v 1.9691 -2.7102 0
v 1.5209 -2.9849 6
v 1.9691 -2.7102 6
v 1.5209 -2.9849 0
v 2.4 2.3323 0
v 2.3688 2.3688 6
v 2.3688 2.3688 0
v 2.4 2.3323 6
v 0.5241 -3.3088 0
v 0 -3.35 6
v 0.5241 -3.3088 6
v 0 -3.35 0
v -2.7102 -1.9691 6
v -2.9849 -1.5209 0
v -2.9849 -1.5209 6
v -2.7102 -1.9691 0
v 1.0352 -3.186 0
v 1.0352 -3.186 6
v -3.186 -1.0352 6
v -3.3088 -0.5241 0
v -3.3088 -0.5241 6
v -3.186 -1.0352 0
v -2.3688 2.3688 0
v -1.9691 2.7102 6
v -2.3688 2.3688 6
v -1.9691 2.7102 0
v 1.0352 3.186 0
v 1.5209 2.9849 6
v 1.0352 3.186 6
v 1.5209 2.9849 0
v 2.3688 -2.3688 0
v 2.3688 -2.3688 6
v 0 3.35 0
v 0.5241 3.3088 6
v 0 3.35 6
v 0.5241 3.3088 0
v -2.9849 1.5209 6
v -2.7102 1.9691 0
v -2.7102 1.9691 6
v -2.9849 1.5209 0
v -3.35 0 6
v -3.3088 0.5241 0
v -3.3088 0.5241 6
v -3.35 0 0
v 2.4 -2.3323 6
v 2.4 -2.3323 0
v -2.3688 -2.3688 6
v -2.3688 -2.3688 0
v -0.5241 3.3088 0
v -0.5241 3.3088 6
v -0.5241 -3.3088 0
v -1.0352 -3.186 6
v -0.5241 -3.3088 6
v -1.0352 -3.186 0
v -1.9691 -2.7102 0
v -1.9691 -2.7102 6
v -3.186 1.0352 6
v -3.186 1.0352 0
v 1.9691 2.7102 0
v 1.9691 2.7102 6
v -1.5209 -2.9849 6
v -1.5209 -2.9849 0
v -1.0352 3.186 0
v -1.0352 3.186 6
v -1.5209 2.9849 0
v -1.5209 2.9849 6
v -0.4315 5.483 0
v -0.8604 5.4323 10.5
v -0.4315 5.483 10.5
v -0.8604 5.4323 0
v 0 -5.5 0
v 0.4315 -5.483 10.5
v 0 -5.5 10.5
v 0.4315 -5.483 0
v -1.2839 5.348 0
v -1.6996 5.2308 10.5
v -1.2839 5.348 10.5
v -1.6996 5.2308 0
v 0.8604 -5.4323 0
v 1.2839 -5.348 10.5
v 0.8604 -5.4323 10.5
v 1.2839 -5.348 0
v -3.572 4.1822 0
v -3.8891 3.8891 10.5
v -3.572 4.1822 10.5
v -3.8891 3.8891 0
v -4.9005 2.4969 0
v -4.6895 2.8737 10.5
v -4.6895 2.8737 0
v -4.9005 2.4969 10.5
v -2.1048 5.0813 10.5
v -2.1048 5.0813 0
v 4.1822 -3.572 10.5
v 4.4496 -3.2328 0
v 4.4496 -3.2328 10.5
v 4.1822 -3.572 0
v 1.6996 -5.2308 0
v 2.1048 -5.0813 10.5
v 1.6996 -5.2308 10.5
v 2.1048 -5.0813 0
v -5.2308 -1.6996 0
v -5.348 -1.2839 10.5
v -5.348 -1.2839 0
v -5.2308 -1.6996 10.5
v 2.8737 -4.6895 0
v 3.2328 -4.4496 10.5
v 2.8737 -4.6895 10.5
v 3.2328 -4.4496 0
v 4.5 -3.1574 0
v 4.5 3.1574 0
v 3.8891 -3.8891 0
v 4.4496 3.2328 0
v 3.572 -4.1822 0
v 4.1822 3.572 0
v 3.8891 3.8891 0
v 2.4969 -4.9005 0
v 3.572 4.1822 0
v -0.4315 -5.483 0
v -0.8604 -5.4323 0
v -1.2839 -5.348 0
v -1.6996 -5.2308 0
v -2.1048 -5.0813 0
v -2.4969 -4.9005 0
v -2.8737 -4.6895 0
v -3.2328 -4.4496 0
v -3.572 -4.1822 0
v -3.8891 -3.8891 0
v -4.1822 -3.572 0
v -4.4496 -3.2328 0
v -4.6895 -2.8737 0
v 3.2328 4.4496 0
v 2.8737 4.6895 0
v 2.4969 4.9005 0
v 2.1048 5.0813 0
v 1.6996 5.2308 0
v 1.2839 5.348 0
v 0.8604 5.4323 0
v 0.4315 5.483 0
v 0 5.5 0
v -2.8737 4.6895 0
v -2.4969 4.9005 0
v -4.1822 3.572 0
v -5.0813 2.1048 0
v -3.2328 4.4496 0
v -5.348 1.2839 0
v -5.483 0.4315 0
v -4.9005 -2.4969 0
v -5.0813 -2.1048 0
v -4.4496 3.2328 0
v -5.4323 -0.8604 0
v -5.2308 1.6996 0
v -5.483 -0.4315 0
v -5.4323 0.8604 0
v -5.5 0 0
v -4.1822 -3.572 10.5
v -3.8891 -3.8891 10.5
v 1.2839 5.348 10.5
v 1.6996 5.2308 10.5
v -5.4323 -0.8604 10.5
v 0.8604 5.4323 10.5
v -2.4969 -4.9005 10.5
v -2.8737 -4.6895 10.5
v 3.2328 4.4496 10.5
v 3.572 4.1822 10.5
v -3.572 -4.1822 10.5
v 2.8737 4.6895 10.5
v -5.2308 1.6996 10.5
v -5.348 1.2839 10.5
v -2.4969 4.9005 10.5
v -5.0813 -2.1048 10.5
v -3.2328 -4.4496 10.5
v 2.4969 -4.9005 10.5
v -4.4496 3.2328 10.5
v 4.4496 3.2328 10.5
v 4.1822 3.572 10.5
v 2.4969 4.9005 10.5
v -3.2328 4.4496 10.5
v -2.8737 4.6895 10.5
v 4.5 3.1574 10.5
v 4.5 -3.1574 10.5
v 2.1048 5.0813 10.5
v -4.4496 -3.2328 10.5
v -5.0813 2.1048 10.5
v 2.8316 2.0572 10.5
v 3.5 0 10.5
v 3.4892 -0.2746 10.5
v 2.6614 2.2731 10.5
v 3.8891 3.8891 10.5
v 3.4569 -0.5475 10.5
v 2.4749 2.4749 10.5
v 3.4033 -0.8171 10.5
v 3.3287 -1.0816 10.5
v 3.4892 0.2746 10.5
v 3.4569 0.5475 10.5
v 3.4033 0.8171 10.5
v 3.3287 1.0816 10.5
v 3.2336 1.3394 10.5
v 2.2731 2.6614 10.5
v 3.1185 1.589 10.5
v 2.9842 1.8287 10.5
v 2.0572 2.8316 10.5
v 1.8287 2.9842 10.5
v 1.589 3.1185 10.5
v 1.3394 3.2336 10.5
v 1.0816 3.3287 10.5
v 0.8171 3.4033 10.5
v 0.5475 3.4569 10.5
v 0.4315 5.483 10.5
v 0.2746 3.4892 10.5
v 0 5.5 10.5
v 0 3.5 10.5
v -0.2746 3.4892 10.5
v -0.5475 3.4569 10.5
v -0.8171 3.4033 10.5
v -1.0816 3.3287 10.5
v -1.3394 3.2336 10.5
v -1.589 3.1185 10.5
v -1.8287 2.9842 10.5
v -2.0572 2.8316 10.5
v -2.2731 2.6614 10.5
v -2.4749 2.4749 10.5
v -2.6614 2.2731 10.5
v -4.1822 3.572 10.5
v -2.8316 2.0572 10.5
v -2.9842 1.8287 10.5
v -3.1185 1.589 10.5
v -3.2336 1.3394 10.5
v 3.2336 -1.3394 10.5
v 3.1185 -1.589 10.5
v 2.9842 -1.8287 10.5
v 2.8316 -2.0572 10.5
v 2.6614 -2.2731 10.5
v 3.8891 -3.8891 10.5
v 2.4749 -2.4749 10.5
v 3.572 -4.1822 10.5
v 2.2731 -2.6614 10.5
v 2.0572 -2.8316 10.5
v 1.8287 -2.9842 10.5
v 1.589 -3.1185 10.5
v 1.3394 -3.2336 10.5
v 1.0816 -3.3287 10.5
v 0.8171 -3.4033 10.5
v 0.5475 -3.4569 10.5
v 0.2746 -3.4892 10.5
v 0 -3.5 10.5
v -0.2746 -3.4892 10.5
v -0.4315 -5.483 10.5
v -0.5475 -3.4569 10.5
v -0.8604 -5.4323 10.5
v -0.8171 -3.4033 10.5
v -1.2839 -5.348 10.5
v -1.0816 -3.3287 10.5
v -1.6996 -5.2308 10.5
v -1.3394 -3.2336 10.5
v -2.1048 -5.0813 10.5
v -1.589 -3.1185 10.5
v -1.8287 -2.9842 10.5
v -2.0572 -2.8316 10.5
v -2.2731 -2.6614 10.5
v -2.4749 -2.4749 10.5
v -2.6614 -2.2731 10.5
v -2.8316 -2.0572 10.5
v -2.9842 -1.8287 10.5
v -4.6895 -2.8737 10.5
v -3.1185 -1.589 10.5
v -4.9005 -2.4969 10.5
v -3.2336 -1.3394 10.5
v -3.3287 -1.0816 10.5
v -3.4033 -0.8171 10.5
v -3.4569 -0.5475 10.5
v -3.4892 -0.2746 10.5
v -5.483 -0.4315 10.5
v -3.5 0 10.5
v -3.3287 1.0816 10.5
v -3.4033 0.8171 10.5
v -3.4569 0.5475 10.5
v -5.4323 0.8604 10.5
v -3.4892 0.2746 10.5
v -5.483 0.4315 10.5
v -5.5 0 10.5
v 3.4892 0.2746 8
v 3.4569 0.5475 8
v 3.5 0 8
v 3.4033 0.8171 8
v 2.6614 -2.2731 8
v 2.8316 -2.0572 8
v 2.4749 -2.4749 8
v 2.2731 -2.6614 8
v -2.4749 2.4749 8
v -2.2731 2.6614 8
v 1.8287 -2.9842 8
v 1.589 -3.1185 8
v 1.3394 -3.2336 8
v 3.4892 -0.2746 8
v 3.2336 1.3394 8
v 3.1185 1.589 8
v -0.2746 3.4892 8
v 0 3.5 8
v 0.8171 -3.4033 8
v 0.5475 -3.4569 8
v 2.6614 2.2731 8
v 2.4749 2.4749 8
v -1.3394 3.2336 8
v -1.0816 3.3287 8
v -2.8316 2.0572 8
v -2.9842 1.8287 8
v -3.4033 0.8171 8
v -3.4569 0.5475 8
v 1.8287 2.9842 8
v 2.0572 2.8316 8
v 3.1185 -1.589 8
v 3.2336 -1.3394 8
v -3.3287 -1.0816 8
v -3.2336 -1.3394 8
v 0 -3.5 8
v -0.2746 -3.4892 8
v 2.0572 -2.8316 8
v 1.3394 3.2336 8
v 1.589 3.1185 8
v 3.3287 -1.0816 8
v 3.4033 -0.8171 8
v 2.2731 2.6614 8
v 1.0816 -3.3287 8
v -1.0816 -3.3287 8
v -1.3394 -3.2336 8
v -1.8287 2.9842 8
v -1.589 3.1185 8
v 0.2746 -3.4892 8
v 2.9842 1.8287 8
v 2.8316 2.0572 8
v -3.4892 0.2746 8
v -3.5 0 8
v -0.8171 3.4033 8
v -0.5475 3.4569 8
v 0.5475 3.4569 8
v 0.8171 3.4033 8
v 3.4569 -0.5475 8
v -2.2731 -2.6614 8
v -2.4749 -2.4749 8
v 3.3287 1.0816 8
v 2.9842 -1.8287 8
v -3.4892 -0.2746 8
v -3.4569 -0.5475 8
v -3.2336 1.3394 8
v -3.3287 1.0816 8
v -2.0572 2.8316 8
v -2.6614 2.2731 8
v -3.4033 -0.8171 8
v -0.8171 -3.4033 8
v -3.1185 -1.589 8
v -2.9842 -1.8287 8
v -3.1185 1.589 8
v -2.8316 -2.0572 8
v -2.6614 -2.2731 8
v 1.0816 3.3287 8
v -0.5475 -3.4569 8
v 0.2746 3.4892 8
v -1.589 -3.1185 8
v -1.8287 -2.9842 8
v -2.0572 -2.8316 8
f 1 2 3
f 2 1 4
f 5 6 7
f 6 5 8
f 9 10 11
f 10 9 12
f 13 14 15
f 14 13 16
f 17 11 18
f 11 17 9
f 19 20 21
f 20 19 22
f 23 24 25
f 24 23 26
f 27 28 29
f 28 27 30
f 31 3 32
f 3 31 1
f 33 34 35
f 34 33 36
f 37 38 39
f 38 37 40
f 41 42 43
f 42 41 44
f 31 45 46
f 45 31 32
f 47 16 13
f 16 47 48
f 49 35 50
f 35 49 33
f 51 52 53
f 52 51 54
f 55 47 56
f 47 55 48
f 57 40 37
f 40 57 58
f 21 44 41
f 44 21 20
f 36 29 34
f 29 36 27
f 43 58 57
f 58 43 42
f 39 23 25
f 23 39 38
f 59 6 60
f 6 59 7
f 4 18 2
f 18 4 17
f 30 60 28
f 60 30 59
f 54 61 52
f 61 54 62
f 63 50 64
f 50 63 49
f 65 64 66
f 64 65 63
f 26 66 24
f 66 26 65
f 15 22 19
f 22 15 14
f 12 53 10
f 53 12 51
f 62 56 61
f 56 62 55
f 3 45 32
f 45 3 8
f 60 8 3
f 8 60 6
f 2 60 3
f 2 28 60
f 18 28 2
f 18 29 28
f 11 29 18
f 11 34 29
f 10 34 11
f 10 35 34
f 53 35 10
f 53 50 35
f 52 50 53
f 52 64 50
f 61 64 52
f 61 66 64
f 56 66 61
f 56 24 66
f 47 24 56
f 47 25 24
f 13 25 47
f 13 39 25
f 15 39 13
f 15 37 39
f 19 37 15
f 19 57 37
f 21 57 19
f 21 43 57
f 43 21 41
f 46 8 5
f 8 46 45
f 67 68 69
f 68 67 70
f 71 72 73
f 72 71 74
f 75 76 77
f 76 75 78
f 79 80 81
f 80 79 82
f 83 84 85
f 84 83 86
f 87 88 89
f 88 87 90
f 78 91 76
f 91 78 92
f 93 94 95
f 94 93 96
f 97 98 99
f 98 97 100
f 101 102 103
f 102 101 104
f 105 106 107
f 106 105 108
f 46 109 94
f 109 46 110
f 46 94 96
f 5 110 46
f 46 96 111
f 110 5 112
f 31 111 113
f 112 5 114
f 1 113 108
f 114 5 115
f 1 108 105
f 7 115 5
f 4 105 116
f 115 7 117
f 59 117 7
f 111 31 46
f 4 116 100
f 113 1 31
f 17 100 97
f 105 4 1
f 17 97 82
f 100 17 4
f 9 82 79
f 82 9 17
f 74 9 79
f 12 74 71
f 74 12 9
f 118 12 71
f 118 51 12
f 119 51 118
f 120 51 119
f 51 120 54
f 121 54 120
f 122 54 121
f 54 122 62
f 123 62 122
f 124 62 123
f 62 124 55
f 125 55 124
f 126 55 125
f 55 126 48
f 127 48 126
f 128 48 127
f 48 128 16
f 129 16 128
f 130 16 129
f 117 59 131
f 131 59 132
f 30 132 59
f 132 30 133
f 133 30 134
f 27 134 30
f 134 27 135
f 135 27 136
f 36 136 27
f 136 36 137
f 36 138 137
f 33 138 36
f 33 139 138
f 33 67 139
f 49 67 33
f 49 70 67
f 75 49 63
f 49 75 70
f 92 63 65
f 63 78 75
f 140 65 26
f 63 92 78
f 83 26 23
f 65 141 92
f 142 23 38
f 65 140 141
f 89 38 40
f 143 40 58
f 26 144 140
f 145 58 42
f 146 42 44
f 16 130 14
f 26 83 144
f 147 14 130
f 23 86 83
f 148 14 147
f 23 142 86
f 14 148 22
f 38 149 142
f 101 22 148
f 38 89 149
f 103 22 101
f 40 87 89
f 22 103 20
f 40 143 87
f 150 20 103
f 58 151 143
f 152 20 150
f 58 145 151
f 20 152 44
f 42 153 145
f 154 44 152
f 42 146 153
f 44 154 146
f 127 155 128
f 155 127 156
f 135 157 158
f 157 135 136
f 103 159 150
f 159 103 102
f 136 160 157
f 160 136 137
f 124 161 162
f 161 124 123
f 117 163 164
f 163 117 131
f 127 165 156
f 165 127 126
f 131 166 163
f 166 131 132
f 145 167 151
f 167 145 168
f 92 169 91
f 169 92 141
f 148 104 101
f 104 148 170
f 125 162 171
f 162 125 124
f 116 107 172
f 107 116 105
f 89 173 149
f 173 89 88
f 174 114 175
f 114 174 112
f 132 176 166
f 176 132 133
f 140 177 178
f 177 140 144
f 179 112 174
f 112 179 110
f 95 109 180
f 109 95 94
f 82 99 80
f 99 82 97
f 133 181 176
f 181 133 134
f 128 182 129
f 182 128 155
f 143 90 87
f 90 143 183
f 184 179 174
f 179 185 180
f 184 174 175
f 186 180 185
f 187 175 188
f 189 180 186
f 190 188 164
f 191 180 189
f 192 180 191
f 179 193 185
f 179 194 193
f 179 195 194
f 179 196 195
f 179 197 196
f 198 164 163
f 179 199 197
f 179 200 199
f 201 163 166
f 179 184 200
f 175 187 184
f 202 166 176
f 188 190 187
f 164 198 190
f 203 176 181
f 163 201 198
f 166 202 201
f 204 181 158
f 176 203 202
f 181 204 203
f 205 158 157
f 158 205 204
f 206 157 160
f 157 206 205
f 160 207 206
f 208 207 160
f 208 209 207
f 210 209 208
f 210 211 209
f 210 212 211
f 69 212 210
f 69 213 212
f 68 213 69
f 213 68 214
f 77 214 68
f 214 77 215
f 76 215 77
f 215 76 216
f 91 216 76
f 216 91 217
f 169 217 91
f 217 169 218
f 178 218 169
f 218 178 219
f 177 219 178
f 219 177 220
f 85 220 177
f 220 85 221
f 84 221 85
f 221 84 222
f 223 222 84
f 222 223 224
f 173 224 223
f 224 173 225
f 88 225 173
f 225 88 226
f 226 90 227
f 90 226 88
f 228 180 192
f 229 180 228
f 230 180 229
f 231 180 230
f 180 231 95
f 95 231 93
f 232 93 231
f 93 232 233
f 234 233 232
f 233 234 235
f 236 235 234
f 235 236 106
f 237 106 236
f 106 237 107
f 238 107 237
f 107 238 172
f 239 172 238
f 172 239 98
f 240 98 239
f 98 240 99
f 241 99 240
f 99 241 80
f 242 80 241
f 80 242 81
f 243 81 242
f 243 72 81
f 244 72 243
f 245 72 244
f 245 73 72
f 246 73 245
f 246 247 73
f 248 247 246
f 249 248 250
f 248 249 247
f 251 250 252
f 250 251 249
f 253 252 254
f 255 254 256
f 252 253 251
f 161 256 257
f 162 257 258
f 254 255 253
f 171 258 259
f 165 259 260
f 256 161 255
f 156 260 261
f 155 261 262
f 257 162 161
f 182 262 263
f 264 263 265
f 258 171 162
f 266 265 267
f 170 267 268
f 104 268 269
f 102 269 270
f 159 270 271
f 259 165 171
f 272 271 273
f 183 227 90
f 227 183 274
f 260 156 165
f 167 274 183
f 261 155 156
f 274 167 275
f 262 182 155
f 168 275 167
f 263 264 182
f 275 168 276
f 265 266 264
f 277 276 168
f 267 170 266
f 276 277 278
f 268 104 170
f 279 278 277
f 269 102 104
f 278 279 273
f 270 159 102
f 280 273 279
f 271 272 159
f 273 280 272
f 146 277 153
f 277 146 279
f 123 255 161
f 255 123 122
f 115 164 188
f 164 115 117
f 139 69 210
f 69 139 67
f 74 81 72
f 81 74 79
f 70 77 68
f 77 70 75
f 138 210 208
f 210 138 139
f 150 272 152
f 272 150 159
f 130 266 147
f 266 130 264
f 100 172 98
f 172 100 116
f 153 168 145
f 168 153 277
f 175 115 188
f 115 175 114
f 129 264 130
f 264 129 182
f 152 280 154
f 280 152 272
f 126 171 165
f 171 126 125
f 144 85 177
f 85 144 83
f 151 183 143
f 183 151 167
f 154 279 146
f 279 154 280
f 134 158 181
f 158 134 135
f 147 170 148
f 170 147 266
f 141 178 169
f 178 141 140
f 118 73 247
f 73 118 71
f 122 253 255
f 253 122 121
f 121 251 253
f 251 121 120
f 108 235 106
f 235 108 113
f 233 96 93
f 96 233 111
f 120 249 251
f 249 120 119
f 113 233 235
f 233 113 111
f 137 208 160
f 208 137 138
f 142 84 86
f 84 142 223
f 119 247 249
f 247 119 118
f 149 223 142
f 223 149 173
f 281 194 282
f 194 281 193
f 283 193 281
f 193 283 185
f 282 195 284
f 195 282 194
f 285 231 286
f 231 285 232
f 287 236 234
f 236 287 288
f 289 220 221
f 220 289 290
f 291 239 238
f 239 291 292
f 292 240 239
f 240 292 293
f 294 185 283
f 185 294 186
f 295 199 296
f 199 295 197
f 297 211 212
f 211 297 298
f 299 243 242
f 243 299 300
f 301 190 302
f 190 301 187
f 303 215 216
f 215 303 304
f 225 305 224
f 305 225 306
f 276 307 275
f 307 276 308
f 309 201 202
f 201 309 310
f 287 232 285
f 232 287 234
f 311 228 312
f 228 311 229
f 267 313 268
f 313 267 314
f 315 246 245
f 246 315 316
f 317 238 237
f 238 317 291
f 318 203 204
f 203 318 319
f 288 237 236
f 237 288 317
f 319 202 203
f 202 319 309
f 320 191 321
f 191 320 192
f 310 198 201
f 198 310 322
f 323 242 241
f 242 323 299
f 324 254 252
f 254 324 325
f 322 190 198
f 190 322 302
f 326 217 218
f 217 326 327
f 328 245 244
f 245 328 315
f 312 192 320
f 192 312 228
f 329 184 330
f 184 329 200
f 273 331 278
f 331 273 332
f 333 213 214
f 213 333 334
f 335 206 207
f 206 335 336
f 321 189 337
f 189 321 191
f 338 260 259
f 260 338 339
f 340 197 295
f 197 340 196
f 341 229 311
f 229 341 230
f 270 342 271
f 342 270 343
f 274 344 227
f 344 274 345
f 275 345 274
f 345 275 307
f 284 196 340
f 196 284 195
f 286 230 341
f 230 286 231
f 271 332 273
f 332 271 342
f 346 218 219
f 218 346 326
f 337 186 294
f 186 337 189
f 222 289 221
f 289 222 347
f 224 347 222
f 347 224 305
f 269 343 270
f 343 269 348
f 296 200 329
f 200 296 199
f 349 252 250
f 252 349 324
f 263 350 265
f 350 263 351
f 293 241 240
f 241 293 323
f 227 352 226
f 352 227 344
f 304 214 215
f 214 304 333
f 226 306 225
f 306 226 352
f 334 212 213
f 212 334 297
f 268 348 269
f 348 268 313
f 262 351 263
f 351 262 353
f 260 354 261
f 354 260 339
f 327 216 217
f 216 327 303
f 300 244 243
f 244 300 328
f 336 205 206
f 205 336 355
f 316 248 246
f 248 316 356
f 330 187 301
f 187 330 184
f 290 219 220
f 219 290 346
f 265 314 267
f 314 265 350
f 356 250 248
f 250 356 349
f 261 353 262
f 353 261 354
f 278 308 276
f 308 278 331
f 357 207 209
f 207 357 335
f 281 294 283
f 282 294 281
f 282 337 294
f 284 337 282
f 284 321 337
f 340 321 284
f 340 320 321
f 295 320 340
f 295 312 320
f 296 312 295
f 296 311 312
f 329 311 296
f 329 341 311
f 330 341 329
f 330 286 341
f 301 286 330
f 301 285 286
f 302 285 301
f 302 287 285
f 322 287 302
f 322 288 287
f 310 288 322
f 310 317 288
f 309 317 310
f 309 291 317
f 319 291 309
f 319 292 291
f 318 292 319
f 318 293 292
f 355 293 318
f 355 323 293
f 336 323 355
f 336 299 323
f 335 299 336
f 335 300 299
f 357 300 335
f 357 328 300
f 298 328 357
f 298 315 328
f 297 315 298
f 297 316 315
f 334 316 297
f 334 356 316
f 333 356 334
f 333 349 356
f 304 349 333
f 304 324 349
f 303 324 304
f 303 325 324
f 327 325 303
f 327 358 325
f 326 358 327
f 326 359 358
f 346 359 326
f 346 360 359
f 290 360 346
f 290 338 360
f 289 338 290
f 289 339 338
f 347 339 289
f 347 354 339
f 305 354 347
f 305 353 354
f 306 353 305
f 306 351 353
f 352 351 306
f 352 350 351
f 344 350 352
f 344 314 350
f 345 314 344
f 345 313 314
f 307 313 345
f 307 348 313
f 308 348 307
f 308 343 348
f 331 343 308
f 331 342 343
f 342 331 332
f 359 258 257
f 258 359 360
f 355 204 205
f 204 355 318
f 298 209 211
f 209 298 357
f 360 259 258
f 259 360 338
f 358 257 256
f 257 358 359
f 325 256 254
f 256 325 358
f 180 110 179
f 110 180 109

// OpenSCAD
/*
Parametric Magnet Holder
Lukas Severinghaus
September 12, 2020
This program generates a 3d model to hold a magnet of a certain size
on top of a keyed axle. All the dimensions can be changed in the 
variables below.
This program is measurement unit independent.
*/

//Height of the motor axle
axle_height = 6;
//Radius of the motor axle
axle_radius = 3.35; //3.1 was too small
//Distance from the center of the axle to where the key starts
key_offset = 2.4;


//Height of the layer between the motor axle and magnet
separator_height = 2;

//Magnet dimensions
magnet_height = 2.5;
magnet_radius = 3.5; //3.2 was too small

//Wall thickness of the piece
wall_thickness = 2;

//Advanced config parameters
//How many lines to break the circle into
circle_resolution = 80;

//How much extra to cut through the faces, smaller is better
cut_offset = 0.1;

//Radius of the outer containing cylinder.
outer_radius = max(magnet_radius, axle_radius) + wall_thickness;

total_height = axle_height + separator_height + magnet_height;
//Cut the magnet hole
difference(){
    //Cut the axle keyed hole out of the bottom of the piece
    difference() {
        //Define the base cylinder
        cylinder(total_height, outer_radius, outer_radius, $fn=circle_resolution);
        //Move the cylinder down a little to fully cut through the face
        translate([0, 0, -1 * cut_offset]){
            //Cut the key in the shaft
            difference() {
                //Define the shaft cylinder
                cylinder(axle_height + cut_offset, axle_radius, axle_radius, $fn=40);
                //Translate and define the key rectangle
                translate([key_offset, -1 * axle_radius, 0]) {
                    cube([axle_radius - key_offset + cut_offset, axle_radius * 2, axle_height + cut_offset]);
                }
            }
        }
    }

    translate([0, 0, axle_height + separator_height]) {
        cylinder(magnet_height + cut_offset, magnet_radius, magnet_radius, $fn=circle_resolution);
    }
    
    translate([4.5, -10, -1 * cut_offset]) cube([1,25, 20]);
}
